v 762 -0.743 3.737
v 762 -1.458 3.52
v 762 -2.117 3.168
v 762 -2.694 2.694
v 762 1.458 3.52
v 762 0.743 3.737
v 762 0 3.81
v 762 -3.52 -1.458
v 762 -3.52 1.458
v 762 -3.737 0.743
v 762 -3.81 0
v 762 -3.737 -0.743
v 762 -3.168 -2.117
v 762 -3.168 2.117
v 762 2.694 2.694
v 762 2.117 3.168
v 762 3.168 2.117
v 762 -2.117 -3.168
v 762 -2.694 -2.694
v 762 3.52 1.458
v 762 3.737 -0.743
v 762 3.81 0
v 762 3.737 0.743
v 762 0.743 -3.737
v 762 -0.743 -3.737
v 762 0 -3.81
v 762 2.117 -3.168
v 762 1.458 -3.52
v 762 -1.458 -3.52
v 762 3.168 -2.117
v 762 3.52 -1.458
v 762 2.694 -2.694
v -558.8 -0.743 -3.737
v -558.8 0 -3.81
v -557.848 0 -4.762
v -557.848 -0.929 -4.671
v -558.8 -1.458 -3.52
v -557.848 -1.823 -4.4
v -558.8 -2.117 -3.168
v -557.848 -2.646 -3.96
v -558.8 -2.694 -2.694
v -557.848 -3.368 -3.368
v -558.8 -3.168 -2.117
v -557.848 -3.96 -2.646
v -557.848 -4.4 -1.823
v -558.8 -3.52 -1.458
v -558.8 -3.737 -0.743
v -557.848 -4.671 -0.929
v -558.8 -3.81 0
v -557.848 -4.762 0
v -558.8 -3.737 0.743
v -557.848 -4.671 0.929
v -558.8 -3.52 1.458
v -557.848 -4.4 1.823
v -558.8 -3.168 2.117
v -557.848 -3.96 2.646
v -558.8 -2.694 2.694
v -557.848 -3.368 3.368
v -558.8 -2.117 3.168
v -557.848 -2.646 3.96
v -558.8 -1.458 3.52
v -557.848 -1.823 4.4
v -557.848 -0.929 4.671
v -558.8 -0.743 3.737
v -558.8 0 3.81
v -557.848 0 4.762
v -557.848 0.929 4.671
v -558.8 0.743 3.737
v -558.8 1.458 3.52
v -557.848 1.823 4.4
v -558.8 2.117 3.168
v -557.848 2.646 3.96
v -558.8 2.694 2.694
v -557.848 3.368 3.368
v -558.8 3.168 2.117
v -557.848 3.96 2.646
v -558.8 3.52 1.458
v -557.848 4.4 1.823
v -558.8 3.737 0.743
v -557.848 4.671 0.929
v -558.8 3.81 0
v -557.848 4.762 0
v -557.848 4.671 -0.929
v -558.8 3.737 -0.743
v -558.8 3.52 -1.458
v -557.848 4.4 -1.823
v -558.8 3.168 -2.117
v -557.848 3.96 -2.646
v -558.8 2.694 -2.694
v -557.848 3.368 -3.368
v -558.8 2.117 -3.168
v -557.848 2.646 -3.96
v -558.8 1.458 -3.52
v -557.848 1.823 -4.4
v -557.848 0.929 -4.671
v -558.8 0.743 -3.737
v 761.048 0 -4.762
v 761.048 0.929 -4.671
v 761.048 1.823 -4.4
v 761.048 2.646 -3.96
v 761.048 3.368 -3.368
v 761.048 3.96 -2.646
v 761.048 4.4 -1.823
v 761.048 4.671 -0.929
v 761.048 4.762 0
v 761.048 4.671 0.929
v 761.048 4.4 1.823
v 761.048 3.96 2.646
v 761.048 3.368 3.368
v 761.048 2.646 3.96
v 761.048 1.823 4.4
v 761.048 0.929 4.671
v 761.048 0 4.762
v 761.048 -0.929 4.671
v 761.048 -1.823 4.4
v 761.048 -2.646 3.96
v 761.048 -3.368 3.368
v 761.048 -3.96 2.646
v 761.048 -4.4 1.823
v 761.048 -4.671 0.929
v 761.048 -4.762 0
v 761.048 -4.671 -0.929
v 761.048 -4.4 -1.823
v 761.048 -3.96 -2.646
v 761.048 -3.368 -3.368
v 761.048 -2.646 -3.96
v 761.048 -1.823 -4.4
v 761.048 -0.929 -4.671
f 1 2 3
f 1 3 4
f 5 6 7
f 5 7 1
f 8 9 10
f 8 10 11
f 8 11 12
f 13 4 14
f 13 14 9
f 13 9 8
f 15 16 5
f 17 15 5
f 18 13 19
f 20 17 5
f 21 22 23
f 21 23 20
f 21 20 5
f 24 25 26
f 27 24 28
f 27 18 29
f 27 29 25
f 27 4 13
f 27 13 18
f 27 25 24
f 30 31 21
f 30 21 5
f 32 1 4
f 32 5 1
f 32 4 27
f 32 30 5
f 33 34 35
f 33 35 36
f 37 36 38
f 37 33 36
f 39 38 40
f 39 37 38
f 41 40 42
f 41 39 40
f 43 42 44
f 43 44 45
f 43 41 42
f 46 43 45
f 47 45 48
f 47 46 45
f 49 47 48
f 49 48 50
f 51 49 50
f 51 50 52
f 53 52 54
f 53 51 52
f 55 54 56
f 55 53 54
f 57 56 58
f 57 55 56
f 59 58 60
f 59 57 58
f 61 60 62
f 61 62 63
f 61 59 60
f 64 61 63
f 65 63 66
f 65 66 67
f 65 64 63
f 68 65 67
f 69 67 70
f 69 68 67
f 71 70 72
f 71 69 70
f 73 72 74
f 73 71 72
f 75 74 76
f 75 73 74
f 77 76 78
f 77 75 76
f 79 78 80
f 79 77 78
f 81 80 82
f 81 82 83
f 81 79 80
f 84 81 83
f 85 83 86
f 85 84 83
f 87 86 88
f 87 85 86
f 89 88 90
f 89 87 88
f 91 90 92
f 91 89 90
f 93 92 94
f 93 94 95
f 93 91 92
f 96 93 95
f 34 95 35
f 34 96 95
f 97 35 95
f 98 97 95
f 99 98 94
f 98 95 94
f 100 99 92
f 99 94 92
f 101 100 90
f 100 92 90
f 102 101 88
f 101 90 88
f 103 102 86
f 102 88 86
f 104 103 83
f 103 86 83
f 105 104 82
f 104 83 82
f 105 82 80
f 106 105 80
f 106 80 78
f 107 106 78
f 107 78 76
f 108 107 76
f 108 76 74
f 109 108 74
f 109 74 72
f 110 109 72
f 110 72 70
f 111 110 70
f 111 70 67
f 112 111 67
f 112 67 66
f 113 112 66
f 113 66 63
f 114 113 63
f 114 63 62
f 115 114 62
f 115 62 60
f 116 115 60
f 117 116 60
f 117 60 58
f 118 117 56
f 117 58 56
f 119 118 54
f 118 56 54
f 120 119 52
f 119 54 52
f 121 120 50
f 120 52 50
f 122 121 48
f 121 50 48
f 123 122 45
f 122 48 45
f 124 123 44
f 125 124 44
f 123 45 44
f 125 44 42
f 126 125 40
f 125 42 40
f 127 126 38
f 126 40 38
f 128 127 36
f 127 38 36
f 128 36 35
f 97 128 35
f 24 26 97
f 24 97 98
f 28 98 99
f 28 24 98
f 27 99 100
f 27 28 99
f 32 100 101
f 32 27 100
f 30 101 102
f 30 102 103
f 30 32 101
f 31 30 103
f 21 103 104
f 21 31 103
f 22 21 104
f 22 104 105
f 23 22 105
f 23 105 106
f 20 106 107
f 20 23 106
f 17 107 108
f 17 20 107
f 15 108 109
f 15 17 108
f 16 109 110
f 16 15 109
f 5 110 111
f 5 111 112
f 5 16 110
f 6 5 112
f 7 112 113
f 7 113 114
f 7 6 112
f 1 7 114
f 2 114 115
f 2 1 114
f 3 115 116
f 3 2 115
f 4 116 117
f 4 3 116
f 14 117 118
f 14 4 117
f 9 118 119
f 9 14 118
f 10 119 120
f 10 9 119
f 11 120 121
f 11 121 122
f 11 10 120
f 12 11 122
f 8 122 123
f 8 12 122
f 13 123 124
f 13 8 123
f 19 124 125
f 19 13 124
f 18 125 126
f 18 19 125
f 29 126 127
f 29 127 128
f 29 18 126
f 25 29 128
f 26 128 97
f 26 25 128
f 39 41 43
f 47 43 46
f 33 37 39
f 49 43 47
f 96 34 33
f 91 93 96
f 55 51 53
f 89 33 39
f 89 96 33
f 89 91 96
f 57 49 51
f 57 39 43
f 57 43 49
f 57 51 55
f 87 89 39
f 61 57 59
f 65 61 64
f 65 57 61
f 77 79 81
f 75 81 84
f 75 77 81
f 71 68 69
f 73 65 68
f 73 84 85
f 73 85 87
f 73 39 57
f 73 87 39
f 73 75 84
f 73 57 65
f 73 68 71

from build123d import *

# Parameters (mm, degrees)
EXTRUDE1_DEPTH      = 762
EXTRUDE1_DEPTH_BACK = 762
SKETCH2_R           = 4.7625
CHAMFER1_SIZE       = 0.9525
SKETCH3_R           = 12.540834079
CUT_EXTRUDE1_DEPTH  = 203.2
CHAMFER2_SIZE       = 0.9525


with BuildPart() as part:
    # Sketch2 → Extrude1 (new, two sides: drawn at the far end of the back side and taken through both)
    with BuildSketch(Plane(origin=(0, 0, 0), x_dir=(0, 0, -1), z_dir=(1, 0, 0)).offset(-EXTRUDE1_DEPTH_BACK)):
        Circle(SKETCH2_R)
    extrude(amount=EXTRUDE1_DEPTH + EXTRUDE1_DEPTH_BACK)

    # Chamfer1
    chamfer1_edges = [part.edges().sort_by_distance(p)[0] for p in [
        (-762, 0, 4.7625),
        (762, 0, 4.7625),
    ]]
    chamfer(chamfer1_edges, length=CHAMFER1_SIZE)

    # Sketch3 → Cut-Extrude1 (cut)
    with BuildSketch(Plane.ZY.offset(762)):
        Circle(SKETCH3_R)
    extrude(amount=-CUT_EXTRUDE1_DEPTH, mode=Mode.SUBTRACT)

    # Chamfer2
    chamfer2_edges = [part.edges().sort_by_distance(p)[0] for p in [
        (-558.8, 0, 4.7625),
    ]]
    chamfer(chamfer2_edges, length=CHAMFER2_SIZE)


solid = part.part
